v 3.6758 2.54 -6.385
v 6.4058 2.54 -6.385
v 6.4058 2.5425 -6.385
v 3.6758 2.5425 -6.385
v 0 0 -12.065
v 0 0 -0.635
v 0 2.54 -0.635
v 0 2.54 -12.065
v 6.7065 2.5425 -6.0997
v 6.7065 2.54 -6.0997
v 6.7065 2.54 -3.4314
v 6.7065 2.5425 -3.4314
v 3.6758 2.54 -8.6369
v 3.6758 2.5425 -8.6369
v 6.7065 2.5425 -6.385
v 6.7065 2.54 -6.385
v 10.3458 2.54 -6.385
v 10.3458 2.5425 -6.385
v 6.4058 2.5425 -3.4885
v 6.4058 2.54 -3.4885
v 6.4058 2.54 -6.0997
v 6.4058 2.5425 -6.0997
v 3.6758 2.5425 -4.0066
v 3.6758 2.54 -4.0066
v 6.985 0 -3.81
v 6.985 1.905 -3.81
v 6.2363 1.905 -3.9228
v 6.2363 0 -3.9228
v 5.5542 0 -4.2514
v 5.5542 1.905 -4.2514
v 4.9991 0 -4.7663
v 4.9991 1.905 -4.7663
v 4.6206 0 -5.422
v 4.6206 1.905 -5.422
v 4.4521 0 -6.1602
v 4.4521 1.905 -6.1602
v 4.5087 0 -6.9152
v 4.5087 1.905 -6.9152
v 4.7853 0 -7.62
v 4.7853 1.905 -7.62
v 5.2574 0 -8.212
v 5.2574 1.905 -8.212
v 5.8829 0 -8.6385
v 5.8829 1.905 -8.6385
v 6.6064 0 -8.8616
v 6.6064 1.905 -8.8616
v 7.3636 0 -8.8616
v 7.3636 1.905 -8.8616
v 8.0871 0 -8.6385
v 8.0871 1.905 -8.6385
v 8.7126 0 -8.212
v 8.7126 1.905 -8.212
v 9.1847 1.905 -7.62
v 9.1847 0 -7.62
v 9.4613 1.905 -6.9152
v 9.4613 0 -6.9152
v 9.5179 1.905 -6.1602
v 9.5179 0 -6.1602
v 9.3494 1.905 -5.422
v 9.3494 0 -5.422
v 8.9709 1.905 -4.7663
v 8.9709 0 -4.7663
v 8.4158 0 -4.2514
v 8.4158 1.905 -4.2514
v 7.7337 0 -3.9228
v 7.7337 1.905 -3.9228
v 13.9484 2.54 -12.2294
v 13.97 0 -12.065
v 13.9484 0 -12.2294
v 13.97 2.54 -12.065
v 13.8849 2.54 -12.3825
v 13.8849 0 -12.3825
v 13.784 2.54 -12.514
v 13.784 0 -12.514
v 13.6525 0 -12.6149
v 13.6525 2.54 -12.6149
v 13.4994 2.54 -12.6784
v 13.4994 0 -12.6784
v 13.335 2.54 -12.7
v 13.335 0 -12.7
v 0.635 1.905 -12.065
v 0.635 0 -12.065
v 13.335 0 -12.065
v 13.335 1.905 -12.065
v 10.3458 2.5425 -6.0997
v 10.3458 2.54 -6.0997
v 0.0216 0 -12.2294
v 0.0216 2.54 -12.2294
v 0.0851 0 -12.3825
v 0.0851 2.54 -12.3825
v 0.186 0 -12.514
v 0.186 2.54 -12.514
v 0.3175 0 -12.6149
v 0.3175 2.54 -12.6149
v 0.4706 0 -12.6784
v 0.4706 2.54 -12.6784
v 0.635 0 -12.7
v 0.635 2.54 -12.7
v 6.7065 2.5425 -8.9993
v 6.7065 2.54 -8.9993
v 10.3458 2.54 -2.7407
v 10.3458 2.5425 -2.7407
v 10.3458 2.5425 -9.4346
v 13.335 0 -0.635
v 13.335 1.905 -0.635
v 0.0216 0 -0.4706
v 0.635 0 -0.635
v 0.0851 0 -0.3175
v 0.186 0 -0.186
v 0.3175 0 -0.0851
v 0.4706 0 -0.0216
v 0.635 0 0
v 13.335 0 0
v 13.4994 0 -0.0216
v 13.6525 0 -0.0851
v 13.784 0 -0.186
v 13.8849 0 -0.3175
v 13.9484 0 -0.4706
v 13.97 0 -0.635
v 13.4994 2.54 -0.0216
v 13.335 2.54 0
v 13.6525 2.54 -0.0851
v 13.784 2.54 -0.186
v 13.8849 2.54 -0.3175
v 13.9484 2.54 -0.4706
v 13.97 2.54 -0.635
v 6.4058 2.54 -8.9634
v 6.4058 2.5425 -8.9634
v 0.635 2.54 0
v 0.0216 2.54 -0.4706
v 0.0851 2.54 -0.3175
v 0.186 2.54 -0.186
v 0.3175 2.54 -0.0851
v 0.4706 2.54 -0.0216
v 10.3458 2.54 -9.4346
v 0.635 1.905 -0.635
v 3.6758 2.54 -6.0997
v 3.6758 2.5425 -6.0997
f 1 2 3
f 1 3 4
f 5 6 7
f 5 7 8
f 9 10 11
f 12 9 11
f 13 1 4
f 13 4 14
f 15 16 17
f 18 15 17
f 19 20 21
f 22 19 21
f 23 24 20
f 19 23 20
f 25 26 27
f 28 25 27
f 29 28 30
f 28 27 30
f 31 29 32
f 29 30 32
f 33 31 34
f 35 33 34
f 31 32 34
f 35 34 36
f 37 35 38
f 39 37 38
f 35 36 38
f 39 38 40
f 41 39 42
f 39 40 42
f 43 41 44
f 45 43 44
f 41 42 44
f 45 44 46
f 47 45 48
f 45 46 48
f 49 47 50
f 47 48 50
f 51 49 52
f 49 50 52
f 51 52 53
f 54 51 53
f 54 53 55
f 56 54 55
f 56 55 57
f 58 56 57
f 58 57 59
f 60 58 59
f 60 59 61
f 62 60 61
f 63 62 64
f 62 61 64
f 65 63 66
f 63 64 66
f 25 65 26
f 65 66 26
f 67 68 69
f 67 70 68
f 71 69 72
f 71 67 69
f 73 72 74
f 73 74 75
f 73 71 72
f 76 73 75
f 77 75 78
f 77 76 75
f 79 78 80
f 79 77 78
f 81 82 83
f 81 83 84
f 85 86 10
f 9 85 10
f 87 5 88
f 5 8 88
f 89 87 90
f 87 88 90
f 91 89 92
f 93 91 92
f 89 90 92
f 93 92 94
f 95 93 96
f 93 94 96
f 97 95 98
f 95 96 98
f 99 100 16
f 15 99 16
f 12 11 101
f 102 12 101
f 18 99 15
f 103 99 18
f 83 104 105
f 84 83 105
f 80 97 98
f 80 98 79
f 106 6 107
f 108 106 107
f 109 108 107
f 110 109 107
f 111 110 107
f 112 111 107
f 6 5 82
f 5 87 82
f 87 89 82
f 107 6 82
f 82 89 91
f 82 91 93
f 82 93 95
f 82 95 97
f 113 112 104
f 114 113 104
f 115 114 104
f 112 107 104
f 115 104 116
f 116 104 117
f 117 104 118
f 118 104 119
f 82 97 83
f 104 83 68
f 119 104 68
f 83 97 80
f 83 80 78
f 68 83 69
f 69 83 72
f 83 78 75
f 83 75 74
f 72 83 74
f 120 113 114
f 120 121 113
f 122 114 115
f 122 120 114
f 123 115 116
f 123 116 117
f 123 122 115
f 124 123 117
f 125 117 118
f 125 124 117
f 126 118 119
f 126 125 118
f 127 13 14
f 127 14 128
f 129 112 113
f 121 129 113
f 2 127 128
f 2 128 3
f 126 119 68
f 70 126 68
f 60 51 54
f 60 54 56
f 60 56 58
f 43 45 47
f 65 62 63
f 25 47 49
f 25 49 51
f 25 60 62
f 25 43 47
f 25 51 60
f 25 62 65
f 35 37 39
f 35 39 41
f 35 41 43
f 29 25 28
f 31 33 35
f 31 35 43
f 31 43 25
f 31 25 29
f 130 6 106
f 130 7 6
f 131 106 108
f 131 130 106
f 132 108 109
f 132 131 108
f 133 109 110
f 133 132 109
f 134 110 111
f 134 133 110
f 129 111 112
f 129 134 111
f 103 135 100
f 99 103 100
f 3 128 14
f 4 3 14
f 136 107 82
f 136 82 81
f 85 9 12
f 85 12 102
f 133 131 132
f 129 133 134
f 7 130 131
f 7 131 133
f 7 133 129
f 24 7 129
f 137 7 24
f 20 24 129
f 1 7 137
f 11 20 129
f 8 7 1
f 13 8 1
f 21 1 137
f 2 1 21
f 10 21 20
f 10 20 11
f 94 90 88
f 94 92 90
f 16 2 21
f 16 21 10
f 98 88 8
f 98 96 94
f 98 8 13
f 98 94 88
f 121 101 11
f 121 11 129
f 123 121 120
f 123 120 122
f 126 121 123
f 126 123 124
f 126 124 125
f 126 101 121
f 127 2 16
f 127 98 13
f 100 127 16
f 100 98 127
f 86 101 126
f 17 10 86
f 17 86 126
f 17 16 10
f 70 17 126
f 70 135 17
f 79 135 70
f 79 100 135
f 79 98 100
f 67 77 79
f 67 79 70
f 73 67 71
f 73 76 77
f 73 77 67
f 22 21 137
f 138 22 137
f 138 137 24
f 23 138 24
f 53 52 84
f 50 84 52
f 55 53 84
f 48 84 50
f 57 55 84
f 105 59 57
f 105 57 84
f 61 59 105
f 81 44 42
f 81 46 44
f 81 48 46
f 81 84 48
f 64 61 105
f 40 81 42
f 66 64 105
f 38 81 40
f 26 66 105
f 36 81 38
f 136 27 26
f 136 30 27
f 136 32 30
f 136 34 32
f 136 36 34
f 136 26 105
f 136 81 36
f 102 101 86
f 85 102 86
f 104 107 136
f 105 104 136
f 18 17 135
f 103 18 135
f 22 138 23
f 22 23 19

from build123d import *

# Parameters (mm, degrees)
SKETCH1_W           = 13.97
SKETCH1_H           = 12.7
BOSS_EXTRUDE1_DEPTH = 2.54
FILLET1_R           = 0.635
SHELL1_START        = 0.635
SHELL1_OUTLINE_W    = 1.905
SHELL1_OUTLINE_H    = 11.43
SHELL1_DEPTH        = 12.7
SKETCH2_R           = 2.54
BOSS_EXTRUDE2_DEPTH = 1.905
BOSS_EXTRUDE4_DEPTH = 0.00254


# Read off the part's stored shape, not the designer's step: Shell1
with BuildPart() as part:
    # Sketch1 → Boss-Extrude1 (new body)
    with BuildSketch(Plane(origin=(0, 0, 0), x_dir=(1, 0, 0), z_dir=(0, 1, 0))):
        with Locations((6.985, 6.35)):
            Rectangle(SKETCH1_W, SKETCH1_H)
    extrude(amount=BOSS_EXTRUDE1_DEPTH)

    # Fillet1
    fillet1_edges = [part.edges().sort_by_distance(p)[0] for p in [
        (0, 1.27, -12.7),
        (13.97, 1.27, -12.7),
        (13.97, 1.27, 0),
        (0, 1.27, 0),
    ]]
    fillet(fillet1_edges, radius=FILLET1_R)

    # Shell1 outline → Shell1 (cut)
    with BuildSketch(Plane.YZ.offset(SHELL1_START)):
        with Locations((0.9525, -6.35)):
            Rectangle(SHELL1_OUTLINE_W, SHELL1_OUTLINE_H)
    extrude(amount=SHELL1_DEPTH, mode=Mode.SUBTRACT)

    # Sketch2 → Boss-Extrude2 (add)
    with BuildSketch(Plane(origin=(0, 1.905, 0), x_dir=(-1, 0, 0), z_dir=(0, -1, 0))):
        with Locations(Location((-6.985, 6.35, 0), (0, 0, 270))):
            Circle(SKETCH2_R)
    extrude(amount=BOSS_EXTRUDE2_DEPTH)

    # Sketch5 → Boss-Extrude4 (add)
    with BuildSketch(Plane(origin=(0, 2.54, 0), x_dir=(1, 0, 0), z_dir=(0, 1, 0))):
        Polygon((3.675799971, 8.636881907), (6.405771964, 8.963367107), (6.405771964, 6.385040601), (3.675799971, 6.385040601), align=None)
        Polygon((3.675799971, 6.099704546), (3.675799971, 4.006611728), (6.405771964, 3.488506251), (6.405771964, 6.099704546), align=None)
        Polygon((6.706531591, 8.999335816), (6.706531591, 6.385040601), (10.345846979, 6.385040601), (10.345846979, 9.434572007), align=None)
        Polygon((6.706531591, 6.099704546), (6.706531591, 3.431426834), (10.345846979, 2.740742373), (10.345846979, 6.099704546), align=None)
    extrude(amount=BOSS_EXTRUDE4_DEPTH)


solid = part.part
